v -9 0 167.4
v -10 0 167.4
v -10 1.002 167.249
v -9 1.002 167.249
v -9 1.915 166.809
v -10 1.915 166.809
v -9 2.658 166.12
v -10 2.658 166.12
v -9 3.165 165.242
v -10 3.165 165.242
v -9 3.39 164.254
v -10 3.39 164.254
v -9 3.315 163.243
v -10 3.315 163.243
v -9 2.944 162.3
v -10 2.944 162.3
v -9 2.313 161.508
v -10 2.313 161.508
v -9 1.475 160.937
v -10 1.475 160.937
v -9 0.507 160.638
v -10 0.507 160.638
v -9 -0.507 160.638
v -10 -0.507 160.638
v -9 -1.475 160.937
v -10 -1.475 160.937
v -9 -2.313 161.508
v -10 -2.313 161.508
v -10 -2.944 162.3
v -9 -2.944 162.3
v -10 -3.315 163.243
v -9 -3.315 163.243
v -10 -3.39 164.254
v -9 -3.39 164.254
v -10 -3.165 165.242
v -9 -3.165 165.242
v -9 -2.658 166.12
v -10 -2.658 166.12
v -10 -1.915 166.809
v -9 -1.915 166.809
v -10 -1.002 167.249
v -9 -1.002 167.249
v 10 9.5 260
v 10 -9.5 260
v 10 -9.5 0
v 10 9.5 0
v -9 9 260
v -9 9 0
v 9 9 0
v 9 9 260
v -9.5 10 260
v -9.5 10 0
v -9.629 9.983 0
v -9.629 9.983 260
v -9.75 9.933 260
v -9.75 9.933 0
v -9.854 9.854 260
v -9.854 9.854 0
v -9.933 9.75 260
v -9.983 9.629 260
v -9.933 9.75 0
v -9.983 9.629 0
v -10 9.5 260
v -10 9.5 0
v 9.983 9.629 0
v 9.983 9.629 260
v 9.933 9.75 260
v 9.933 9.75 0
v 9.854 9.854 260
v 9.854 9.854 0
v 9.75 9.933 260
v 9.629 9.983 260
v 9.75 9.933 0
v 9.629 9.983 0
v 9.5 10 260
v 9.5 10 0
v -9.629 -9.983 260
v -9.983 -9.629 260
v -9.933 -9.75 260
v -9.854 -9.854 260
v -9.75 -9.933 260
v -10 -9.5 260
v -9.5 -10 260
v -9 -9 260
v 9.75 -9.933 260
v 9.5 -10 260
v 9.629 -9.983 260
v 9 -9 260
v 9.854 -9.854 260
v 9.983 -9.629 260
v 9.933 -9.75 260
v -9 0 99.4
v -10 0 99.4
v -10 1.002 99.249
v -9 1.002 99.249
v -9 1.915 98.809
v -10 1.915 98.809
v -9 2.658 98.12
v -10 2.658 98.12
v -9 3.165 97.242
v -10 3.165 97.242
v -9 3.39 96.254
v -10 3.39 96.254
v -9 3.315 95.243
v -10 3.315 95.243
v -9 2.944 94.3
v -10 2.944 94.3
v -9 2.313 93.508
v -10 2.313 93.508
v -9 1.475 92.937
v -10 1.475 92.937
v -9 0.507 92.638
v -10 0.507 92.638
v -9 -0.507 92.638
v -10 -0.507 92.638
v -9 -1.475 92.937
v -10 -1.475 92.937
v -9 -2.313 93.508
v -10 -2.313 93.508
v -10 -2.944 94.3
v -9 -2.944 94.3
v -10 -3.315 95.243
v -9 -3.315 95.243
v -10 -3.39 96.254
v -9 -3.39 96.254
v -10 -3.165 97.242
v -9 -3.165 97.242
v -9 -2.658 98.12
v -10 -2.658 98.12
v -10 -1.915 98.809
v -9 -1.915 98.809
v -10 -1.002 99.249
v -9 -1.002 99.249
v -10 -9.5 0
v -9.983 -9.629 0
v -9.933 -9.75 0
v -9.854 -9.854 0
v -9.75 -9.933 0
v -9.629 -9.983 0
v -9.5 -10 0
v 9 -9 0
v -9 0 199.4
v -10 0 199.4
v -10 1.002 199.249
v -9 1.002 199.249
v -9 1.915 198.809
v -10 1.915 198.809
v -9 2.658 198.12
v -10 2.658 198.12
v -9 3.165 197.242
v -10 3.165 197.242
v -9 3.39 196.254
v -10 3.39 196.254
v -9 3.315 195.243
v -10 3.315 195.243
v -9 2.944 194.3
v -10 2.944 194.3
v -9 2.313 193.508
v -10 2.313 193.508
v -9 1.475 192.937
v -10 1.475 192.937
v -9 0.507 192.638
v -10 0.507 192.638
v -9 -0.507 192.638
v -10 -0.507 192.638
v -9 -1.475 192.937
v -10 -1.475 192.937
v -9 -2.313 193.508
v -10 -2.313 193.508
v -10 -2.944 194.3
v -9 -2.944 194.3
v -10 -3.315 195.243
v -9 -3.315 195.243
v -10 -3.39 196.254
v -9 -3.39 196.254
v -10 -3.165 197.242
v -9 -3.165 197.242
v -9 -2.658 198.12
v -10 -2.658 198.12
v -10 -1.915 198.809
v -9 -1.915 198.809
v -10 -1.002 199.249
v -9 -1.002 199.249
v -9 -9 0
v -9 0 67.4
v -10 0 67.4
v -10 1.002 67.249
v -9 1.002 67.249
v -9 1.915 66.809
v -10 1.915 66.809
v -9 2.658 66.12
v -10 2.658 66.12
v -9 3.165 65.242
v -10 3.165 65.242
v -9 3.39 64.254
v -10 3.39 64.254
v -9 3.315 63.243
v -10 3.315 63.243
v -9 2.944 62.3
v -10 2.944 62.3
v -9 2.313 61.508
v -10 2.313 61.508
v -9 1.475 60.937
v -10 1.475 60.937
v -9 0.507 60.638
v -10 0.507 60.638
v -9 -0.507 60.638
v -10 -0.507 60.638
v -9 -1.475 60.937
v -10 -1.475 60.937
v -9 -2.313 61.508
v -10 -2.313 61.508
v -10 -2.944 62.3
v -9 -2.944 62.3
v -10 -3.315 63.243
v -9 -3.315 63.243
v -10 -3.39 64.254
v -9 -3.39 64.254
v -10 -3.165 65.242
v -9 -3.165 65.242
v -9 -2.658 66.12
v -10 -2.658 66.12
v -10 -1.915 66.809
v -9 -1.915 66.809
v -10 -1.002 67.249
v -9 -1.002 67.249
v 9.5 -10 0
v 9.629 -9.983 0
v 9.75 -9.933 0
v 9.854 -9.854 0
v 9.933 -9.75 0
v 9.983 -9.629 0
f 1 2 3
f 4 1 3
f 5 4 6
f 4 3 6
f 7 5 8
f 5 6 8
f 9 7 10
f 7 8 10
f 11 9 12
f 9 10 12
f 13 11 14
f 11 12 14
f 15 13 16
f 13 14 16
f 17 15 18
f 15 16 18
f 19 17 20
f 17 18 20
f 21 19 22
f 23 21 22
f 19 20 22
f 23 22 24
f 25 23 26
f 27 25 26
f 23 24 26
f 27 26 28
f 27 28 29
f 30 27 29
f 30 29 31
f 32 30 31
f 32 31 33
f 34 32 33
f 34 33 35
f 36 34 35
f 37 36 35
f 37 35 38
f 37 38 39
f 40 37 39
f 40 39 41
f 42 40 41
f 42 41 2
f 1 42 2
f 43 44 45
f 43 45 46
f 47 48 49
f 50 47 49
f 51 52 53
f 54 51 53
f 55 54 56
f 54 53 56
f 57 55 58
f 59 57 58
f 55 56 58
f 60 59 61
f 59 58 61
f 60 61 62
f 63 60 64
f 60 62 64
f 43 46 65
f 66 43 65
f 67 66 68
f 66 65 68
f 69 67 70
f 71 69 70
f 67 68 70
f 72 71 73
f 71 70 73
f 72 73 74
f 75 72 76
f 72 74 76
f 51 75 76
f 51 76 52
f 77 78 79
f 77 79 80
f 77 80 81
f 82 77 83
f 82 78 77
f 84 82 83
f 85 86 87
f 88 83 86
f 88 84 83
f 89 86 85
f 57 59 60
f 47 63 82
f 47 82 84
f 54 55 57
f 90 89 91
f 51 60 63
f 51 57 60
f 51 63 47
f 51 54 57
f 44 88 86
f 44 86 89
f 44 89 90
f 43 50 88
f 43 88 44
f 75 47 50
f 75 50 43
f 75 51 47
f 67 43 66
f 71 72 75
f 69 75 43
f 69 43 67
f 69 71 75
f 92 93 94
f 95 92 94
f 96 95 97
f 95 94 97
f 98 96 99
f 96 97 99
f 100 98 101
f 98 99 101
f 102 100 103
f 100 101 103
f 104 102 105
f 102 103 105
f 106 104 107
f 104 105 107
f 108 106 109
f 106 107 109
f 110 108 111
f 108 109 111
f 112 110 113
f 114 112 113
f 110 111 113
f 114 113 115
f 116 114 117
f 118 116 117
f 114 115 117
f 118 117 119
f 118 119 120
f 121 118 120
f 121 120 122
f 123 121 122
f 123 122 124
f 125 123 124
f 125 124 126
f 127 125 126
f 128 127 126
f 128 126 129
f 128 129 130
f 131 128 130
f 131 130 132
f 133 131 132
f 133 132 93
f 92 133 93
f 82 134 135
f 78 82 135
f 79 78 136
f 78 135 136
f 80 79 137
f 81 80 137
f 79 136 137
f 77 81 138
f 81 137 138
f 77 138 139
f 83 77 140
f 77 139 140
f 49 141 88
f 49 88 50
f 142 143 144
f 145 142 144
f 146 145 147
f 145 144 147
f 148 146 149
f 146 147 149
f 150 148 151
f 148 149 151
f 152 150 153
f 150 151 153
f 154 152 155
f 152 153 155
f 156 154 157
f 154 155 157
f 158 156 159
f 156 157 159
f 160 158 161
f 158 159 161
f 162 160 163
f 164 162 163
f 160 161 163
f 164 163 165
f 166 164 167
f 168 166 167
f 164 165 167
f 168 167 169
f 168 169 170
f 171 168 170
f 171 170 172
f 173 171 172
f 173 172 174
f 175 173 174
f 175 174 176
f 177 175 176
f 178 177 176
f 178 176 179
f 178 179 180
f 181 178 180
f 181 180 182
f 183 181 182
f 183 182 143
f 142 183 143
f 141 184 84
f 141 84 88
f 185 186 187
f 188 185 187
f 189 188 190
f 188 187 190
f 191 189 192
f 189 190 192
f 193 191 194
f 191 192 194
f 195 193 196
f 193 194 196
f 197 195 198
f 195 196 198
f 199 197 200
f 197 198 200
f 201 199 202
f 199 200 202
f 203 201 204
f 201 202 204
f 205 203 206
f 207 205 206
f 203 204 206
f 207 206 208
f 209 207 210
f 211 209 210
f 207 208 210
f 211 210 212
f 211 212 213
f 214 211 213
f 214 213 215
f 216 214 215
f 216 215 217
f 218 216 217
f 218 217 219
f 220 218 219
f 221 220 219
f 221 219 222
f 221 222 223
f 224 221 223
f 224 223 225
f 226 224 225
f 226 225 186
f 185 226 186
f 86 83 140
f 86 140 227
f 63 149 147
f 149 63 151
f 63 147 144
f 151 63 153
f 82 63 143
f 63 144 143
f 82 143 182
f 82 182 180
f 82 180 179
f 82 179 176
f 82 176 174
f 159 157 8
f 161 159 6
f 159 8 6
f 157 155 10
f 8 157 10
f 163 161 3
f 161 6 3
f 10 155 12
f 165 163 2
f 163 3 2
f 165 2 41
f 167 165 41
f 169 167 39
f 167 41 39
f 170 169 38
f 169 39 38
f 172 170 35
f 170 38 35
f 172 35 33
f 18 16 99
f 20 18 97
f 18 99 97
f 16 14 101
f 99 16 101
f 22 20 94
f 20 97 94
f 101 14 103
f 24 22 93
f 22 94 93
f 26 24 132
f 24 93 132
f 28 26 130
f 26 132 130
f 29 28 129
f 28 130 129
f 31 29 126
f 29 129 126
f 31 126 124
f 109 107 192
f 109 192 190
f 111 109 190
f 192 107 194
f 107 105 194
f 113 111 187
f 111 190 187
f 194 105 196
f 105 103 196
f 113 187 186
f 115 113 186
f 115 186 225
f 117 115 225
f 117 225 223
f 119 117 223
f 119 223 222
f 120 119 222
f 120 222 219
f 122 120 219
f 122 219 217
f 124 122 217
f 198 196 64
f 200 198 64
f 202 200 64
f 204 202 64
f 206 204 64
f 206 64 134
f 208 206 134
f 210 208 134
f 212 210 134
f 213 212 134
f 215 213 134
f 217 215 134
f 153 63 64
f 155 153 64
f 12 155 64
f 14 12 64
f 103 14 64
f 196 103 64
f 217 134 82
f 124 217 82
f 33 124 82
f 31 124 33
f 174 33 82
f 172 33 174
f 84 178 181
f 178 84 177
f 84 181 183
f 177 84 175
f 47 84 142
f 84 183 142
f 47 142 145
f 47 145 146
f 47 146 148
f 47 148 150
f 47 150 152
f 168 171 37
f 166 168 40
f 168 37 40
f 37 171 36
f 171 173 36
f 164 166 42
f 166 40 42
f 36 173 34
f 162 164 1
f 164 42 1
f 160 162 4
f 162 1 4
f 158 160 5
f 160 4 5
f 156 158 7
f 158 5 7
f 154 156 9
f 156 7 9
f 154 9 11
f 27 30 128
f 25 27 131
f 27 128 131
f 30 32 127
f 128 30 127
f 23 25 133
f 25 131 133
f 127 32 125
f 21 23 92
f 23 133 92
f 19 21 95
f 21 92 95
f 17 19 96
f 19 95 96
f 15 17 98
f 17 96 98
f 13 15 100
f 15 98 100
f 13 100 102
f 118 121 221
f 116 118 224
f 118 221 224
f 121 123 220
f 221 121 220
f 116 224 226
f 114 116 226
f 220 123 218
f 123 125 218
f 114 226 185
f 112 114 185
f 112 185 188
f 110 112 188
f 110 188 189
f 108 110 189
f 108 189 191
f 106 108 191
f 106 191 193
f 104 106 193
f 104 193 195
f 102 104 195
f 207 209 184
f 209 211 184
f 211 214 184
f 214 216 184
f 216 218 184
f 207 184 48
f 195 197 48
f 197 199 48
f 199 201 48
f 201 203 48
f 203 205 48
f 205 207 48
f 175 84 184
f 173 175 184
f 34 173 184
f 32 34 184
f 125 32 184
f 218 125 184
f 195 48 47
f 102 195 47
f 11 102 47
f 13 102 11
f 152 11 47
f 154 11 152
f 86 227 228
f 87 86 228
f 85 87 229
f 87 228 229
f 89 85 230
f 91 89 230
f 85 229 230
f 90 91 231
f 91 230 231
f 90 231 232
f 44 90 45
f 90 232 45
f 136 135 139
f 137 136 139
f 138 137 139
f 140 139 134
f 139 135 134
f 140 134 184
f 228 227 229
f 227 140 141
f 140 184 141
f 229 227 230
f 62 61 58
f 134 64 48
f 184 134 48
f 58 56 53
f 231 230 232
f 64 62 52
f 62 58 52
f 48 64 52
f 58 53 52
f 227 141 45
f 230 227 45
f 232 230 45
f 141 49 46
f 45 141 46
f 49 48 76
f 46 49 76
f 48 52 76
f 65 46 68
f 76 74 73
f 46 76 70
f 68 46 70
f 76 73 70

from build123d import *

# Parameters (mm, degrees)
SKETCH1_W           = 18
SKETCH1_H           = 18
EXTRUDE_THIN1_DEPTH = 260
SKETCH2_R           = 3.4
CUT_EXTRUDE1_DEPTH  = 10


with BuildPart() as part:
    # Sketch1 → Extrude-Thin1 (new body)
    with BuildSketch(Plane.XY):
        with BuildLine():
            Line((-10, 9.5), (-10, -9.5))
            ThreePointArc((-10, -9.5), (-9.853553391, -9.853553391), (-9.5, -10))
            Line((-9.5, -10), (9.5, -10))
            ThreePointArc((9.5, -10), (9.853553391, -9.853553391), (10, -9.5))
            Line((10, -9.5), (10, 9.5))
            ThreePointArc((10, 9.5), (9.853553391, 9.853553391), (9.5, 10))
            Line((9.5, 10), (-9.5, 10))
            ThreePointArc((-9.5, 10), (-9.853553391, 9.853553391), (-10, 9.5))
        make_face()
        Rectangle(SKETCH1_W, SKETCH1_H, mode=Mode.SUBTRACT)
    extrude(amount=EXTRUDE_THIN1_DEPTH)

    # Sketch2 → Cut-Extrude1 (cut)
    with BuildSketch(Plane.ZY.offset(10)):
        with Locations((64, 0)):
            Circle(SKETCH2_R)
        with Locations((164, 0)):
            Circle(SKETCH2_R)
        with Locations((196, 0)):
            Circle(SKETCH2_R)
        with Locations((96, 0)):
            Circle(SKETCH2_R)
    extrude(amount=-CUT_EXTRUDE1_DEPTH, mode=Mode.SUBTRACT)


solid = part.part
